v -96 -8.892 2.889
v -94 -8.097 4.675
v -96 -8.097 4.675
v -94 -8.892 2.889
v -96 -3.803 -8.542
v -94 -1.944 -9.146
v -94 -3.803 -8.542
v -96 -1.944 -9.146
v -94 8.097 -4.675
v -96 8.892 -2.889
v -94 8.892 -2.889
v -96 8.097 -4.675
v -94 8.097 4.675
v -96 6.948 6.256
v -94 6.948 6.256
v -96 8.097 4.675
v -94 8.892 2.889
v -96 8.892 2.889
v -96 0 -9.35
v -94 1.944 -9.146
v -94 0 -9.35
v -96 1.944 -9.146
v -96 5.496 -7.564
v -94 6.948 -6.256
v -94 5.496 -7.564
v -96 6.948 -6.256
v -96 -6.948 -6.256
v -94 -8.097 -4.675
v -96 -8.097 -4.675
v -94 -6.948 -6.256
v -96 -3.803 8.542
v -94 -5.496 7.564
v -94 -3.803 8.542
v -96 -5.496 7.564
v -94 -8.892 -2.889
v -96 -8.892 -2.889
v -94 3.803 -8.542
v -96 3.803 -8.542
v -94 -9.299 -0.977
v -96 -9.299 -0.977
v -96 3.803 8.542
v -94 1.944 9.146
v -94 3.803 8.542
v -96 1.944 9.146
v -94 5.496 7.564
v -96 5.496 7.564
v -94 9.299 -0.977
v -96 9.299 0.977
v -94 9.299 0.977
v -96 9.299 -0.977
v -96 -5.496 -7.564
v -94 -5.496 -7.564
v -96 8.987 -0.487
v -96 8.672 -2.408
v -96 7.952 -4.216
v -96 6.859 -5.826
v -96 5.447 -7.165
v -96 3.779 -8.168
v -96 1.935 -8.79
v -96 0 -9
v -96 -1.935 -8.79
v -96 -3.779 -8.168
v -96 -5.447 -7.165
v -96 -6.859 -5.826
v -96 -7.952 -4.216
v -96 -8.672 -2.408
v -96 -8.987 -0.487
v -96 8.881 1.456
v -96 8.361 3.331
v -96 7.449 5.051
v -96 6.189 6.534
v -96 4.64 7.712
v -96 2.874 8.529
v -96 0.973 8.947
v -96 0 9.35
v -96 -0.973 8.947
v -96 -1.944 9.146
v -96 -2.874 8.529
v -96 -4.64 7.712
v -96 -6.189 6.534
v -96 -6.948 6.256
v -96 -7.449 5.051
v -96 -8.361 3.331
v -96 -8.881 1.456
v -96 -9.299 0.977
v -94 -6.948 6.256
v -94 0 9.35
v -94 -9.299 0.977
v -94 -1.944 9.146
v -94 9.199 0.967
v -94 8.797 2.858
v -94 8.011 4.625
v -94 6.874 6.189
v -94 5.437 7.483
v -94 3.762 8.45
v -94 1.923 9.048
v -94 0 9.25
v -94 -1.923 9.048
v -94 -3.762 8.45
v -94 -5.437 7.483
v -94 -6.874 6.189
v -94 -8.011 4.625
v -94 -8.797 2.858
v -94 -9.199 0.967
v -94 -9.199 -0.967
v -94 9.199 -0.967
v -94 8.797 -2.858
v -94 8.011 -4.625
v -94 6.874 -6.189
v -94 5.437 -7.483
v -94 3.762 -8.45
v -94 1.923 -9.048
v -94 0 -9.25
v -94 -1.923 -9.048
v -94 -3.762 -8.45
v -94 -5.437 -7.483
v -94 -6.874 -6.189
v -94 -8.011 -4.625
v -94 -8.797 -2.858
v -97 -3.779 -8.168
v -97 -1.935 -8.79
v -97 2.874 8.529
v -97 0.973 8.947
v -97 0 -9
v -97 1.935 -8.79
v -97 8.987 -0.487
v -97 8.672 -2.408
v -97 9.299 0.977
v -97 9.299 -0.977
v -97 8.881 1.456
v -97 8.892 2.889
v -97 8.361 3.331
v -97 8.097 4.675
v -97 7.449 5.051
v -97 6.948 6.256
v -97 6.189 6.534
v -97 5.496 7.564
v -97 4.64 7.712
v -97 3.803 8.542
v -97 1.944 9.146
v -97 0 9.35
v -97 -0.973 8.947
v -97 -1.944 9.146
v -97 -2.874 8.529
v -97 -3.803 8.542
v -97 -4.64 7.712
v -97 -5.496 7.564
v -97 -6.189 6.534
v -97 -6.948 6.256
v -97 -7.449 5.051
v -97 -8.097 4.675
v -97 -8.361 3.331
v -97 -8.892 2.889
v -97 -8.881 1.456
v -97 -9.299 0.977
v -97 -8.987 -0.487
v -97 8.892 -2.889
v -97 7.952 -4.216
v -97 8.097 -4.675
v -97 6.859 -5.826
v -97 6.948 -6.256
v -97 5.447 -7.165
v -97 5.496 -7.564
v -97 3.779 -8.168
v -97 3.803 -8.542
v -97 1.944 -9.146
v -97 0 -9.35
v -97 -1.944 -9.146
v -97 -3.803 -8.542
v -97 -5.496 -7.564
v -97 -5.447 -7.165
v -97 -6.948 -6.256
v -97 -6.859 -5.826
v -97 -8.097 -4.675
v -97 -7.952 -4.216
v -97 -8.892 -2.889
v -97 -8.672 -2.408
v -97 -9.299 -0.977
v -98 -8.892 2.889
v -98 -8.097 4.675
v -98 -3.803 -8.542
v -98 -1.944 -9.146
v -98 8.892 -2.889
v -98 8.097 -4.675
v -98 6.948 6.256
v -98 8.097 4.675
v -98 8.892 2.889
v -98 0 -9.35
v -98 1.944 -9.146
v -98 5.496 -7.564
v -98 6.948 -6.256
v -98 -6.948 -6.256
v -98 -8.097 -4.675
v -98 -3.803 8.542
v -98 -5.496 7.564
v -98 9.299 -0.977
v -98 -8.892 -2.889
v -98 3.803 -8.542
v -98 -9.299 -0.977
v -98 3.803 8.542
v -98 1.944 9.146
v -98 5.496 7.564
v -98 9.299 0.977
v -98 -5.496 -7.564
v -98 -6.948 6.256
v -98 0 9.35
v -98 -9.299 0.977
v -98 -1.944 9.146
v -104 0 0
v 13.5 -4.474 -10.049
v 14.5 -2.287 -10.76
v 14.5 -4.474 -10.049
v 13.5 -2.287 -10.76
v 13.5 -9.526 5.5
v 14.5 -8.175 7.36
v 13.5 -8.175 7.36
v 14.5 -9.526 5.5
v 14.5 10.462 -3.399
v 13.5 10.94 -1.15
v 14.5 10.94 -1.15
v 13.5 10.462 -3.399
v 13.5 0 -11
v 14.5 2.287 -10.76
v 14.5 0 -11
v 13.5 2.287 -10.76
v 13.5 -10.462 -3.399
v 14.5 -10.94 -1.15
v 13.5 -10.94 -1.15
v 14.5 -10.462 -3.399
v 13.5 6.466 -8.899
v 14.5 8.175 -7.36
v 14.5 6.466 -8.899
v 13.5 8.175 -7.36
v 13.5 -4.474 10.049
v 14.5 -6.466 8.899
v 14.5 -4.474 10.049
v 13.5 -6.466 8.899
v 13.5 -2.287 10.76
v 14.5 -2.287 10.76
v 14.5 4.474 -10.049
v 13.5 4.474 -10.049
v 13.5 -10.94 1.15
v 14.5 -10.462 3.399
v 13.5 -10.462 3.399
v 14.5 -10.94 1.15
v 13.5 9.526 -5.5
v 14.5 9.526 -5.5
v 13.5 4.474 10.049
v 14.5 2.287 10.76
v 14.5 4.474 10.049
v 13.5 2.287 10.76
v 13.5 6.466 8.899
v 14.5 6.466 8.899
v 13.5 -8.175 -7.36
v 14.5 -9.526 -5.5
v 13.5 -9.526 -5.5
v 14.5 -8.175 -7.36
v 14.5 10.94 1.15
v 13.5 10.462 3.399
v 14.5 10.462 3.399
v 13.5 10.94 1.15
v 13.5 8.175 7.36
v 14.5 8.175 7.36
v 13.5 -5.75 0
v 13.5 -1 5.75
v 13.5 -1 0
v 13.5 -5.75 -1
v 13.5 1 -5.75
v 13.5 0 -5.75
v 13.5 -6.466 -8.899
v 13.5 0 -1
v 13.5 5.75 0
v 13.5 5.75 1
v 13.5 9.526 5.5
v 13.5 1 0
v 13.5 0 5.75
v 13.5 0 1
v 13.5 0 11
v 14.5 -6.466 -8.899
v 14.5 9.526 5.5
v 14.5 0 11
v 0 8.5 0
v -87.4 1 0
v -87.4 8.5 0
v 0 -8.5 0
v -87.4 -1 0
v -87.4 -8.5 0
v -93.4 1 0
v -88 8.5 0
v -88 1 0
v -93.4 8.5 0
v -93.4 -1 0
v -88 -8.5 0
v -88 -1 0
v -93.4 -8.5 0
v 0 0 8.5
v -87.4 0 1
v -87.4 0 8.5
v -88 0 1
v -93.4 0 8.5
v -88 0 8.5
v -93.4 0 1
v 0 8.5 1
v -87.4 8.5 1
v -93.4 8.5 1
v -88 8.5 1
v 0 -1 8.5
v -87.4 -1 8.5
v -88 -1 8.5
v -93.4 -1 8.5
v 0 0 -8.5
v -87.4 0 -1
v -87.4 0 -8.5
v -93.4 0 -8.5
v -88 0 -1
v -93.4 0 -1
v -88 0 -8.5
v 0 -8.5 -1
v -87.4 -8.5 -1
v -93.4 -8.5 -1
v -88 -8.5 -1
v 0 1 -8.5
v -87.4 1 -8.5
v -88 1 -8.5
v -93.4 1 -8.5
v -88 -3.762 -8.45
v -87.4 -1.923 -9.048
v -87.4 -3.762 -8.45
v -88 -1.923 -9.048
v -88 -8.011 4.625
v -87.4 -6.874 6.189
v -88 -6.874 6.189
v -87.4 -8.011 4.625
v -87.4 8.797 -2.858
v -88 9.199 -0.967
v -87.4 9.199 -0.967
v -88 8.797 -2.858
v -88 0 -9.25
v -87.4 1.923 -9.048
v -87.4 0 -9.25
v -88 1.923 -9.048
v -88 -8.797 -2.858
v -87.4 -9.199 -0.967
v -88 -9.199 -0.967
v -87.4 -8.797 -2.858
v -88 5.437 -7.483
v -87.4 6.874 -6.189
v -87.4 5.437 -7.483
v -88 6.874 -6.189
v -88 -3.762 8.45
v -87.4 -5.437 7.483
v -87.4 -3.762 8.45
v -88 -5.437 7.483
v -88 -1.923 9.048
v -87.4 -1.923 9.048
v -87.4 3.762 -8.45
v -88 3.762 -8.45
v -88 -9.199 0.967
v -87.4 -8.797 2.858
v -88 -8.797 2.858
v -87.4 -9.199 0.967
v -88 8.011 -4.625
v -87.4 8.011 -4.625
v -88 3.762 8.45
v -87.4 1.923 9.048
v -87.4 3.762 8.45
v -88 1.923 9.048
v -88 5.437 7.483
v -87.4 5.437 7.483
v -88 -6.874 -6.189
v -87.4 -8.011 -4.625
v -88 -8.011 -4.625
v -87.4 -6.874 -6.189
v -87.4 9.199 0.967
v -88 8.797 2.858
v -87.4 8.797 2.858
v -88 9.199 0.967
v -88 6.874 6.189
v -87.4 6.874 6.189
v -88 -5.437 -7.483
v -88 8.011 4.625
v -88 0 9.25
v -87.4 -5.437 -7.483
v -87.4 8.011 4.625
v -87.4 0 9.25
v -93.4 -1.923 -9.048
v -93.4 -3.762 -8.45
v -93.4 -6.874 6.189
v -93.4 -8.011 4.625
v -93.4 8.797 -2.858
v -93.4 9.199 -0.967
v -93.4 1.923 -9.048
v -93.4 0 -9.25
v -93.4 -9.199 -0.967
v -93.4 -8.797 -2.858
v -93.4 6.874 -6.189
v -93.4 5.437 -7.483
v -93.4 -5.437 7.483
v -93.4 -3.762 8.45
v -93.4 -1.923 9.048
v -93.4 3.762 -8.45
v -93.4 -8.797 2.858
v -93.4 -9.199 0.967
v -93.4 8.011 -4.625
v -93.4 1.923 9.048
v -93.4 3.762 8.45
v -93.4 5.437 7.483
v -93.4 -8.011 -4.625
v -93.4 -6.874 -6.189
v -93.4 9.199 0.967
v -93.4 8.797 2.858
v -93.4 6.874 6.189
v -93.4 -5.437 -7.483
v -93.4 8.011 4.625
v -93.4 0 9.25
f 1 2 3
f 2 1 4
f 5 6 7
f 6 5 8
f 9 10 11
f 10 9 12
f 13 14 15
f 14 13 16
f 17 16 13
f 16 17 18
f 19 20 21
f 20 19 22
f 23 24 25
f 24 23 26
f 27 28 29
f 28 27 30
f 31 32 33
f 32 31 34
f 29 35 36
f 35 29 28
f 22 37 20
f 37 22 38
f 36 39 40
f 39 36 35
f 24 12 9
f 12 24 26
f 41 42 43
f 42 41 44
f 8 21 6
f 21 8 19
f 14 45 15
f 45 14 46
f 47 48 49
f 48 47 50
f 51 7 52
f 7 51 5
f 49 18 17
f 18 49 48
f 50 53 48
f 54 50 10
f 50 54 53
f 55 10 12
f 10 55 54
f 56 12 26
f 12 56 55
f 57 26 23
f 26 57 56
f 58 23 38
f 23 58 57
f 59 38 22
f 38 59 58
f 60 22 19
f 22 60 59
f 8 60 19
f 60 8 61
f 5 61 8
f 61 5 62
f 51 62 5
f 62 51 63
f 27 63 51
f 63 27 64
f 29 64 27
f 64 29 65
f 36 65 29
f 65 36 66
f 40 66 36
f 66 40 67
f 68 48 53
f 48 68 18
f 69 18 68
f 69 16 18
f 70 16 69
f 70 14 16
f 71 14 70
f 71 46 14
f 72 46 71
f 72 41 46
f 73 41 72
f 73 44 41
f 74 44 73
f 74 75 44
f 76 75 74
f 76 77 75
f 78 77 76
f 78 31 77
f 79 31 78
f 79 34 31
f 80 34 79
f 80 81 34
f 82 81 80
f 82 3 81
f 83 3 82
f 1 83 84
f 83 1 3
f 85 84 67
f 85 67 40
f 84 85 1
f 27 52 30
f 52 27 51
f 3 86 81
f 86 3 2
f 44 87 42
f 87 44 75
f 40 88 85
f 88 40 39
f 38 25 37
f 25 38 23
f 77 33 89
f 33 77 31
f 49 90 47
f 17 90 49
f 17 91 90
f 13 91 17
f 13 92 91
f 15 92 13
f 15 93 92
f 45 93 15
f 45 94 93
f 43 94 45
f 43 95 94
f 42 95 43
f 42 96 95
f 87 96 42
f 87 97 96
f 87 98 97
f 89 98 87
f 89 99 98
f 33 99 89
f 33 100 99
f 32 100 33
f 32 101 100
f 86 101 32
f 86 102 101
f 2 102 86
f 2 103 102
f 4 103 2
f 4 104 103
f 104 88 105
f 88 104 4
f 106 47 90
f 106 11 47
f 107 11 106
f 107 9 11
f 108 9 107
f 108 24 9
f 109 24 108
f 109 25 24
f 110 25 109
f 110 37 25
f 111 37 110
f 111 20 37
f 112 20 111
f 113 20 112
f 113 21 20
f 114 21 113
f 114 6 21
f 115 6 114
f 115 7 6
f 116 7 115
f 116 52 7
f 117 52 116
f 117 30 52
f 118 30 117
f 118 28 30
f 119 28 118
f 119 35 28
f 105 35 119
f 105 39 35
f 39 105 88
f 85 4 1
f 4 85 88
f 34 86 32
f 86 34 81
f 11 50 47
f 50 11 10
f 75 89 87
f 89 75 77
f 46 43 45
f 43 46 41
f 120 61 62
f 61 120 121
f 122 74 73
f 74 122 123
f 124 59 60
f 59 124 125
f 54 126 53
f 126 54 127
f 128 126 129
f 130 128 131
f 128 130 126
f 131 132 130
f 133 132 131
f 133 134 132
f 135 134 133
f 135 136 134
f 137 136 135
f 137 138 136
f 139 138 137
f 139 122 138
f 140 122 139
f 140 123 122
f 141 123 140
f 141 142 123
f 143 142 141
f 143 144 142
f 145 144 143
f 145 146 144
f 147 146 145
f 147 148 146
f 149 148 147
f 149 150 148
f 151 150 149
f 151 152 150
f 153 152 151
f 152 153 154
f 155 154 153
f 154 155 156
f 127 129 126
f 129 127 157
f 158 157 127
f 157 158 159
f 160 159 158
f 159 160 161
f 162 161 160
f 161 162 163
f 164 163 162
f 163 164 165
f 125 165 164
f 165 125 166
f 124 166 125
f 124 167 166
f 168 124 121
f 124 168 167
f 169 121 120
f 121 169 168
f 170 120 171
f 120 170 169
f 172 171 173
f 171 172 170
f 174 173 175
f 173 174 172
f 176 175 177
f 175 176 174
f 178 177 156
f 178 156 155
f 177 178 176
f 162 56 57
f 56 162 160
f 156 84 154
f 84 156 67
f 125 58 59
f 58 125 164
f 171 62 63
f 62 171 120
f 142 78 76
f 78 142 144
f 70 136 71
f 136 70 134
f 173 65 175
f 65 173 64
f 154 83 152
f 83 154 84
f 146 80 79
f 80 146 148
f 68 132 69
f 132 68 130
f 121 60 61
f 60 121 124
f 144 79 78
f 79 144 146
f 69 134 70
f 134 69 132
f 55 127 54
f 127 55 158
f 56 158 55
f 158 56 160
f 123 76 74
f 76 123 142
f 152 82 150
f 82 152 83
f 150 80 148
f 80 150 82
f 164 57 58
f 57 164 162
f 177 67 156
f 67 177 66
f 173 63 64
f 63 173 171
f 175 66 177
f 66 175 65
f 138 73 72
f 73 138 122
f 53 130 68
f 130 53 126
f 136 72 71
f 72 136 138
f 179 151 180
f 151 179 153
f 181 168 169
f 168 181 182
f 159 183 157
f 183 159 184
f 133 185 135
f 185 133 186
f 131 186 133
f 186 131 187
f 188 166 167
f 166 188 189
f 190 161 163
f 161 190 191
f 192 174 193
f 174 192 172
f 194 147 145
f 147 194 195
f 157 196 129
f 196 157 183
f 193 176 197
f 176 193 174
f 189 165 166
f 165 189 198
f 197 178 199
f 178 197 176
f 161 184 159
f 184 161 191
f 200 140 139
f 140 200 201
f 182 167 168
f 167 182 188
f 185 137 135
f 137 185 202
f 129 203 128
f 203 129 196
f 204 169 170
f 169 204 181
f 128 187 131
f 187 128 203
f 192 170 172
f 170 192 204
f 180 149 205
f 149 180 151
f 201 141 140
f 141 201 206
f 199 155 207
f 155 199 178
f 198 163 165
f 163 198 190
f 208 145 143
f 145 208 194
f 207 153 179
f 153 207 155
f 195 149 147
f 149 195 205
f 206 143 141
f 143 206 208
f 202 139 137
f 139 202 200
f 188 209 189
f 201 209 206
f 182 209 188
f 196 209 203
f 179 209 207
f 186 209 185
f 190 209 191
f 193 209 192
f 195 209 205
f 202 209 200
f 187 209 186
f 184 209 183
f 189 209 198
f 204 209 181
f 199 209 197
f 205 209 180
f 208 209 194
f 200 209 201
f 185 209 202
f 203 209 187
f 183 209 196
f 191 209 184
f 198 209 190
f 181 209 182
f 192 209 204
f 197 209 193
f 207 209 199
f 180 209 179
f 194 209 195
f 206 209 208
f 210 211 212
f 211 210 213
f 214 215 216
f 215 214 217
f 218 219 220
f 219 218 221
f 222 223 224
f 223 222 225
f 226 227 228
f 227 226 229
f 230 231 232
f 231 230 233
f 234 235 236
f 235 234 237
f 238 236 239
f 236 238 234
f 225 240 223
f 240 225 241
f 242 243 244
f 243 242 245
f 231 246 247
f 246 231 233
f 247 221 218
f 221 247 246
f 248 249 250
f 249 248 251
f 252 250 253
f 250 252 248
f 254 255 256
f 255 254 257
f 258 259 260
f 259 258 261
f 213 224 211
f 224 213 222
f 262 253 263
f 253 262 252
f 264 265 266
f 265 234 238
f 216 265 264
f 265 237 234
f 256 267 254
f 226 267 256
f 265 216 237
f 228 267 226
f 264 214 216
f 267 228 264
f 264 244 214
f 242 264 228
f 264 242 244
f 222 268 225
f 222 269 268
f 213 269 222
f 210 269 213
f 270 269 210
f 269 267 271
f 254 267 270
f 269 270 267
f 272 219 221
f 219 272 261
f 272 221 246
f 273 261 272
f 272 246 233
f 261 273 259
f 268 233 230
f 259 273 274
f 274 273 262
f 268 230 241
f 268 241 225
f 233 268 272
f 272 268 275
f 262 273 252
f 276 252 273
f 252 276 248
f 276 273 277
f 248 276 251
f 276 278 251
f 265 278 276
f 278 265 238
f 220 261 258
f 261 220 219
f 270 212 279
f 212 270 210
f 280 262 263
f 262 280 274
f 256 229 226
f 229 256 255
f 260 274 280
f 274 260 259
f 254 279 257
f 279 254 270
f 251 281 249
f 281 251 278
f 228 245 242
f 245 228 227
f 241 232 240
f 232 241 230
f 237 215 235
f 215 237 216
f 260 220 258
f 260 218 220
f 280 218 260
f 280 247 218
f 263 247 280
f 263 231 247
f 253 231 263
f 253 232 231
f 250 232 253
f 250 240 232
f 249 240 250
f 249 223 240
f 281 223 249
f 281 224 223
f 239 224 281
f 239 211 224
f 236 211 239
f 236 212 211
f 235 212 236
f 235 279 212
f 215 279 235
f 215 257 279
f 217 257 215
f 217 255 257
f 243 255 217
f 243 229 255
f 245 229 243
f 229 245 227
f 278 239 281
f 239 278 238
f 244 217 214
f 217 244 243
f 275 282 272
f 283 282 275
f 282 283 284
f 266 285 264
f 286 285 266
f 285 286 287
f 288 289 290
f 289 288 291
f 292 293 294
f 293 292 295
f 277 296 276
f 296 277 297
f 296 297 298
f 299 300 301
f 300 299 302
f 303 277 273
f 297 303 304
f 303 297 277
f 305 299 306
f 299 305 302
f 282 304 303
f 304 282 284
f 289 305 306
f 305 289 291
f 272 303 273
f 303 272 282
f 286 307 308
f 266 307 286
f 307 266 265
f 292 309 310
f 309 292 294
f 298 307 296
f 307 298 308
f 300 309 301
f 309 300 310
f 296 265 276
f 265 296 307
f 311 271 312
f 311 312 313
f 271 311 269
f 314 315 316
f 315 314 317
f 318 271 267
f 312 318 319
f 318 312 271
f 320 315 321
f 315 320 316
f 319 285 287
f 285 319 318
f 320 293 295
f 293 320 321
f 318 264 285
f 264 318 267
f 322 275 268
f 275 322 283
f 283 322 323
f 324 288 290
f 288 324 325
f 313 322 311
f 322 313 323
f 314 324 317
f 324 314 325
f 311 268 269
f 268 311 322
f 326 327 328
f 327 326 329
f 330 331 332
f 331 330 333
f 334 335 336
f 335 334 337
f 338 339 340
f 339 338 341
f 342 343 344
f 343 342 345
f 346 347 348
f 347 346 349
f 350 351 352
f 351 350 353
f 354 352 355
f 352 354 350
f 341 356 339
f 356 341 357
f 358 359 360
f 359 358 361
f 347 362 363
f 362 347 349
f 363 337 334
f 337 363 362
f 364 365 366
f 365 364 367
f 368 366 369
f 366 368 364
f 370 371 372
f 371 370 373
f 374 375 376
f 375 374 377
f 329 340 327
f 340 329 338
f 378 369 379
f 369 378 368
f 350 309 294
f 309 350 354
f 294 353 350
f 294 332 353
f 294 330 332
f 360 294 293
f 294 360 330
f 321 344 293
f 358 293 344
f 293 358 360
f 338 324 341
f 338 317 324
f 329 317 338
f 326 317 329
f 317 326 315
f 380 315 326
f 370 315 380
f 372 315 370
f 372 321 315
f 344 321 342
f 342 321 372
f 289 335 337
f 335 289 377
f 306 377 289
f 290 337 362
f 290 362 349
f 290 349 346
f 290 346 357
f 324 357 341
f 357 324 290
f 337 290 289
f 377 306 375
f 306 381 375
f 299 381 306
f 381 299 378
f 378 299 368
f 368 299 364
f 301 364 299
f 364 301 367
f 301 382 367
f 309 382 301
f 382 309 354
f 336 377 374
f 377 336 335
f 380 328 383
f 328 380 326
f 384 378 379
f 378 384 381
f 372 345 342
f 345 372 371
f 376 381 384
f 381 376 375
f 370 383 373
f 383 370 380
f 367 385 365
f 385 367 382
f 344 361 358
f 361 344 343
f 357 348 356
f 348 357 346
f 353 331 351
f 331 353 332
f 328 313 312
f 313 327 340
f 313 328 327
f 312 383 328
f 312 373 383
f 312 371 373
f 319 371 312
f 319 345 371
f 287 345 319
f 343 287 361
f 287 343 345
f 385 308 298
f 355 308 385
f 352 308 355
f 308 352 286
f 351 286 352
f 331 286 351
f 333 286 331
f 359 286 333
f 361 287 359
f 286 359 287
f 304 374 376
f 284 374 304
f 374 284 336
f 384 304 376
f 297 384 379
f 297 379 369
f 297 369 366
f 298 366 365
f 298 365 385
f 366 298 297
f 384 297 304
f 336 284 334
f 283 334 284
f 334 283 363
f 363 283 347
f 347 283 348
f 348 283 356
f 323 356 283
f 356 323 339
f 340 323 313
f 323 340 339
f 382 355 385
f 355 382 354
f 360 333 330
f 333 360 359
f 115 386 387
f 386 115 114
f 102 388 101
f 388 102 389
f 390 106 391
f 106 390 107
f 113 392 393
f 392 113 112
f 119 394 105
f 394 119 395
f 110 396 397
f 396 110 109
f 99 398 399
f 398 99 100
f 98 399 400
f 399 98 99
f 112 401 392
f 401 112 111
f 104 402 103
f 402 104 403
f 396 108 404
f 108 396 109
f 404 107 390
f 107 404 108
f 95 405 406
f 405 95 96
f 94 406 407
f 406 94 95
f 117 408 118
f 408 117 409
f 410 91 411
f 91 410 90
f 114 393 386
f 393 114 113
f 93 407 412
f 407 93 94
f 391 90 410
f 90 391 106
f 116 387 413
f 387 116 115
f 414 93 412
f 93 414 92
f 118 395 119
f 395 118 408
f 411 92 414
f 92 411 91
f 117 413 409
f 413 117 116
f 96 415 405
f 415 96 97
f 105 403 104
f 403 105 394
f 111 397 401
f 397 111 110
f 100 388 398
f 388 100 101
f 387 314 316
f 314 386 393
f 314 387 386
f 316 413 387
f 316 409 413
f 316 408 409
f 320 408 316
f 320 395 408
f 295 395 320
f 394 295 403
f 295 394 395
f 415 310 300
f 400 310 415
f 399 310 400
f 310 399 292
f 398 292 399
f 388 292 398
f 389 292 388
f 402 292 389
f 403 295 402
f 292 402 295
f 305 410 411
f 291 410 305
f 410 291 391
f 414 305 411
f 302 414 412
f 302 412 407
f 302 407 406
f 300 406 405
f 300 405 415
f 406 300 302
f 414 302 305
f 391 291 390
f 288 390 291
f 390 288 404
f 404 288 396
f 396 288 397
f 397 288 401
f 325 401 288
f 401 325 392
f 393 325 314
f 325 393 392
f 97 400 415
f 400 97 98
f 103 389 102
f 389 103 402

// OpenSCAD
//linear_extrude( height=2.5 ) polygon( points = [ [0,5.25], [0,19.75], [ 20, 25], [40, 19.75], [40, 5.25], [20,0], [0,5.25] ]);

//the top disk-needs to be measured
translate([13.5, 0, 0]) rotate( [0,90,0] ) cylinder(h=1, r=22/2);

// one 'wing'
linear_extrude( height=1 ) polygon( points = [[-94,0],[-94,8.5], [0,8.5], [ 13.5, 5.75], [13.5,0],  [-94,0] ]);
rotate([90,0,0]) linear_extrude( height=1 ) polygon( points = [[-94,0],[-94,8.5], [0,8.5], [ 13.5, 5.75], [13.5,0],  [-94,0] ]);
rotate([180,0,0]) linear_extrude( height=1 ) polygon( points = [[-94,0],[-94,8.5], [0,8.5], [ 13.5, 5.75], [13.5,0],  [-94,0] ]);
rotate([270,0,0]) linear_extrude( height=1 ) polygon( points = [[-94,0],[-94,8.5], [0,8.5], [ 13.5, 5.75], [13.5,0],  [-94,0] ]);



//linear_extrude( height=1 ) polygon( points = [[-88,0], [-94,0], [-94, 8.5], [-88,8.5],[-88,0] ]);

translate([-88, 0, 0]) rotate( [0,90,0] ) cylinder(h=.6, r=18.5/2);
translate([-94, 0, 0]) rotate( [0,90,0] ) cylinder(h=.6, r=18.5/2);

color("black") {
    translate([-96, 0, 0]) rotate( [0,90,0] ) cylinder(h=2, r=18.7/2);
    translate([-97, 0, 0]) rotate( [0,90,0] ) cylinder(r=18.0/2, height=1);
    translate([-98, 0, 0]) rotate( [0,90,0] ) cylinder(r=18.7/2, height=2);
    translate([-104, 0, 0]) rotate( [0,90,0] ) cylinder(h=6, r1=0, r2=18.7/2);
}
//cylinder(r2=18.7/2, r1=.1, height=-19);
